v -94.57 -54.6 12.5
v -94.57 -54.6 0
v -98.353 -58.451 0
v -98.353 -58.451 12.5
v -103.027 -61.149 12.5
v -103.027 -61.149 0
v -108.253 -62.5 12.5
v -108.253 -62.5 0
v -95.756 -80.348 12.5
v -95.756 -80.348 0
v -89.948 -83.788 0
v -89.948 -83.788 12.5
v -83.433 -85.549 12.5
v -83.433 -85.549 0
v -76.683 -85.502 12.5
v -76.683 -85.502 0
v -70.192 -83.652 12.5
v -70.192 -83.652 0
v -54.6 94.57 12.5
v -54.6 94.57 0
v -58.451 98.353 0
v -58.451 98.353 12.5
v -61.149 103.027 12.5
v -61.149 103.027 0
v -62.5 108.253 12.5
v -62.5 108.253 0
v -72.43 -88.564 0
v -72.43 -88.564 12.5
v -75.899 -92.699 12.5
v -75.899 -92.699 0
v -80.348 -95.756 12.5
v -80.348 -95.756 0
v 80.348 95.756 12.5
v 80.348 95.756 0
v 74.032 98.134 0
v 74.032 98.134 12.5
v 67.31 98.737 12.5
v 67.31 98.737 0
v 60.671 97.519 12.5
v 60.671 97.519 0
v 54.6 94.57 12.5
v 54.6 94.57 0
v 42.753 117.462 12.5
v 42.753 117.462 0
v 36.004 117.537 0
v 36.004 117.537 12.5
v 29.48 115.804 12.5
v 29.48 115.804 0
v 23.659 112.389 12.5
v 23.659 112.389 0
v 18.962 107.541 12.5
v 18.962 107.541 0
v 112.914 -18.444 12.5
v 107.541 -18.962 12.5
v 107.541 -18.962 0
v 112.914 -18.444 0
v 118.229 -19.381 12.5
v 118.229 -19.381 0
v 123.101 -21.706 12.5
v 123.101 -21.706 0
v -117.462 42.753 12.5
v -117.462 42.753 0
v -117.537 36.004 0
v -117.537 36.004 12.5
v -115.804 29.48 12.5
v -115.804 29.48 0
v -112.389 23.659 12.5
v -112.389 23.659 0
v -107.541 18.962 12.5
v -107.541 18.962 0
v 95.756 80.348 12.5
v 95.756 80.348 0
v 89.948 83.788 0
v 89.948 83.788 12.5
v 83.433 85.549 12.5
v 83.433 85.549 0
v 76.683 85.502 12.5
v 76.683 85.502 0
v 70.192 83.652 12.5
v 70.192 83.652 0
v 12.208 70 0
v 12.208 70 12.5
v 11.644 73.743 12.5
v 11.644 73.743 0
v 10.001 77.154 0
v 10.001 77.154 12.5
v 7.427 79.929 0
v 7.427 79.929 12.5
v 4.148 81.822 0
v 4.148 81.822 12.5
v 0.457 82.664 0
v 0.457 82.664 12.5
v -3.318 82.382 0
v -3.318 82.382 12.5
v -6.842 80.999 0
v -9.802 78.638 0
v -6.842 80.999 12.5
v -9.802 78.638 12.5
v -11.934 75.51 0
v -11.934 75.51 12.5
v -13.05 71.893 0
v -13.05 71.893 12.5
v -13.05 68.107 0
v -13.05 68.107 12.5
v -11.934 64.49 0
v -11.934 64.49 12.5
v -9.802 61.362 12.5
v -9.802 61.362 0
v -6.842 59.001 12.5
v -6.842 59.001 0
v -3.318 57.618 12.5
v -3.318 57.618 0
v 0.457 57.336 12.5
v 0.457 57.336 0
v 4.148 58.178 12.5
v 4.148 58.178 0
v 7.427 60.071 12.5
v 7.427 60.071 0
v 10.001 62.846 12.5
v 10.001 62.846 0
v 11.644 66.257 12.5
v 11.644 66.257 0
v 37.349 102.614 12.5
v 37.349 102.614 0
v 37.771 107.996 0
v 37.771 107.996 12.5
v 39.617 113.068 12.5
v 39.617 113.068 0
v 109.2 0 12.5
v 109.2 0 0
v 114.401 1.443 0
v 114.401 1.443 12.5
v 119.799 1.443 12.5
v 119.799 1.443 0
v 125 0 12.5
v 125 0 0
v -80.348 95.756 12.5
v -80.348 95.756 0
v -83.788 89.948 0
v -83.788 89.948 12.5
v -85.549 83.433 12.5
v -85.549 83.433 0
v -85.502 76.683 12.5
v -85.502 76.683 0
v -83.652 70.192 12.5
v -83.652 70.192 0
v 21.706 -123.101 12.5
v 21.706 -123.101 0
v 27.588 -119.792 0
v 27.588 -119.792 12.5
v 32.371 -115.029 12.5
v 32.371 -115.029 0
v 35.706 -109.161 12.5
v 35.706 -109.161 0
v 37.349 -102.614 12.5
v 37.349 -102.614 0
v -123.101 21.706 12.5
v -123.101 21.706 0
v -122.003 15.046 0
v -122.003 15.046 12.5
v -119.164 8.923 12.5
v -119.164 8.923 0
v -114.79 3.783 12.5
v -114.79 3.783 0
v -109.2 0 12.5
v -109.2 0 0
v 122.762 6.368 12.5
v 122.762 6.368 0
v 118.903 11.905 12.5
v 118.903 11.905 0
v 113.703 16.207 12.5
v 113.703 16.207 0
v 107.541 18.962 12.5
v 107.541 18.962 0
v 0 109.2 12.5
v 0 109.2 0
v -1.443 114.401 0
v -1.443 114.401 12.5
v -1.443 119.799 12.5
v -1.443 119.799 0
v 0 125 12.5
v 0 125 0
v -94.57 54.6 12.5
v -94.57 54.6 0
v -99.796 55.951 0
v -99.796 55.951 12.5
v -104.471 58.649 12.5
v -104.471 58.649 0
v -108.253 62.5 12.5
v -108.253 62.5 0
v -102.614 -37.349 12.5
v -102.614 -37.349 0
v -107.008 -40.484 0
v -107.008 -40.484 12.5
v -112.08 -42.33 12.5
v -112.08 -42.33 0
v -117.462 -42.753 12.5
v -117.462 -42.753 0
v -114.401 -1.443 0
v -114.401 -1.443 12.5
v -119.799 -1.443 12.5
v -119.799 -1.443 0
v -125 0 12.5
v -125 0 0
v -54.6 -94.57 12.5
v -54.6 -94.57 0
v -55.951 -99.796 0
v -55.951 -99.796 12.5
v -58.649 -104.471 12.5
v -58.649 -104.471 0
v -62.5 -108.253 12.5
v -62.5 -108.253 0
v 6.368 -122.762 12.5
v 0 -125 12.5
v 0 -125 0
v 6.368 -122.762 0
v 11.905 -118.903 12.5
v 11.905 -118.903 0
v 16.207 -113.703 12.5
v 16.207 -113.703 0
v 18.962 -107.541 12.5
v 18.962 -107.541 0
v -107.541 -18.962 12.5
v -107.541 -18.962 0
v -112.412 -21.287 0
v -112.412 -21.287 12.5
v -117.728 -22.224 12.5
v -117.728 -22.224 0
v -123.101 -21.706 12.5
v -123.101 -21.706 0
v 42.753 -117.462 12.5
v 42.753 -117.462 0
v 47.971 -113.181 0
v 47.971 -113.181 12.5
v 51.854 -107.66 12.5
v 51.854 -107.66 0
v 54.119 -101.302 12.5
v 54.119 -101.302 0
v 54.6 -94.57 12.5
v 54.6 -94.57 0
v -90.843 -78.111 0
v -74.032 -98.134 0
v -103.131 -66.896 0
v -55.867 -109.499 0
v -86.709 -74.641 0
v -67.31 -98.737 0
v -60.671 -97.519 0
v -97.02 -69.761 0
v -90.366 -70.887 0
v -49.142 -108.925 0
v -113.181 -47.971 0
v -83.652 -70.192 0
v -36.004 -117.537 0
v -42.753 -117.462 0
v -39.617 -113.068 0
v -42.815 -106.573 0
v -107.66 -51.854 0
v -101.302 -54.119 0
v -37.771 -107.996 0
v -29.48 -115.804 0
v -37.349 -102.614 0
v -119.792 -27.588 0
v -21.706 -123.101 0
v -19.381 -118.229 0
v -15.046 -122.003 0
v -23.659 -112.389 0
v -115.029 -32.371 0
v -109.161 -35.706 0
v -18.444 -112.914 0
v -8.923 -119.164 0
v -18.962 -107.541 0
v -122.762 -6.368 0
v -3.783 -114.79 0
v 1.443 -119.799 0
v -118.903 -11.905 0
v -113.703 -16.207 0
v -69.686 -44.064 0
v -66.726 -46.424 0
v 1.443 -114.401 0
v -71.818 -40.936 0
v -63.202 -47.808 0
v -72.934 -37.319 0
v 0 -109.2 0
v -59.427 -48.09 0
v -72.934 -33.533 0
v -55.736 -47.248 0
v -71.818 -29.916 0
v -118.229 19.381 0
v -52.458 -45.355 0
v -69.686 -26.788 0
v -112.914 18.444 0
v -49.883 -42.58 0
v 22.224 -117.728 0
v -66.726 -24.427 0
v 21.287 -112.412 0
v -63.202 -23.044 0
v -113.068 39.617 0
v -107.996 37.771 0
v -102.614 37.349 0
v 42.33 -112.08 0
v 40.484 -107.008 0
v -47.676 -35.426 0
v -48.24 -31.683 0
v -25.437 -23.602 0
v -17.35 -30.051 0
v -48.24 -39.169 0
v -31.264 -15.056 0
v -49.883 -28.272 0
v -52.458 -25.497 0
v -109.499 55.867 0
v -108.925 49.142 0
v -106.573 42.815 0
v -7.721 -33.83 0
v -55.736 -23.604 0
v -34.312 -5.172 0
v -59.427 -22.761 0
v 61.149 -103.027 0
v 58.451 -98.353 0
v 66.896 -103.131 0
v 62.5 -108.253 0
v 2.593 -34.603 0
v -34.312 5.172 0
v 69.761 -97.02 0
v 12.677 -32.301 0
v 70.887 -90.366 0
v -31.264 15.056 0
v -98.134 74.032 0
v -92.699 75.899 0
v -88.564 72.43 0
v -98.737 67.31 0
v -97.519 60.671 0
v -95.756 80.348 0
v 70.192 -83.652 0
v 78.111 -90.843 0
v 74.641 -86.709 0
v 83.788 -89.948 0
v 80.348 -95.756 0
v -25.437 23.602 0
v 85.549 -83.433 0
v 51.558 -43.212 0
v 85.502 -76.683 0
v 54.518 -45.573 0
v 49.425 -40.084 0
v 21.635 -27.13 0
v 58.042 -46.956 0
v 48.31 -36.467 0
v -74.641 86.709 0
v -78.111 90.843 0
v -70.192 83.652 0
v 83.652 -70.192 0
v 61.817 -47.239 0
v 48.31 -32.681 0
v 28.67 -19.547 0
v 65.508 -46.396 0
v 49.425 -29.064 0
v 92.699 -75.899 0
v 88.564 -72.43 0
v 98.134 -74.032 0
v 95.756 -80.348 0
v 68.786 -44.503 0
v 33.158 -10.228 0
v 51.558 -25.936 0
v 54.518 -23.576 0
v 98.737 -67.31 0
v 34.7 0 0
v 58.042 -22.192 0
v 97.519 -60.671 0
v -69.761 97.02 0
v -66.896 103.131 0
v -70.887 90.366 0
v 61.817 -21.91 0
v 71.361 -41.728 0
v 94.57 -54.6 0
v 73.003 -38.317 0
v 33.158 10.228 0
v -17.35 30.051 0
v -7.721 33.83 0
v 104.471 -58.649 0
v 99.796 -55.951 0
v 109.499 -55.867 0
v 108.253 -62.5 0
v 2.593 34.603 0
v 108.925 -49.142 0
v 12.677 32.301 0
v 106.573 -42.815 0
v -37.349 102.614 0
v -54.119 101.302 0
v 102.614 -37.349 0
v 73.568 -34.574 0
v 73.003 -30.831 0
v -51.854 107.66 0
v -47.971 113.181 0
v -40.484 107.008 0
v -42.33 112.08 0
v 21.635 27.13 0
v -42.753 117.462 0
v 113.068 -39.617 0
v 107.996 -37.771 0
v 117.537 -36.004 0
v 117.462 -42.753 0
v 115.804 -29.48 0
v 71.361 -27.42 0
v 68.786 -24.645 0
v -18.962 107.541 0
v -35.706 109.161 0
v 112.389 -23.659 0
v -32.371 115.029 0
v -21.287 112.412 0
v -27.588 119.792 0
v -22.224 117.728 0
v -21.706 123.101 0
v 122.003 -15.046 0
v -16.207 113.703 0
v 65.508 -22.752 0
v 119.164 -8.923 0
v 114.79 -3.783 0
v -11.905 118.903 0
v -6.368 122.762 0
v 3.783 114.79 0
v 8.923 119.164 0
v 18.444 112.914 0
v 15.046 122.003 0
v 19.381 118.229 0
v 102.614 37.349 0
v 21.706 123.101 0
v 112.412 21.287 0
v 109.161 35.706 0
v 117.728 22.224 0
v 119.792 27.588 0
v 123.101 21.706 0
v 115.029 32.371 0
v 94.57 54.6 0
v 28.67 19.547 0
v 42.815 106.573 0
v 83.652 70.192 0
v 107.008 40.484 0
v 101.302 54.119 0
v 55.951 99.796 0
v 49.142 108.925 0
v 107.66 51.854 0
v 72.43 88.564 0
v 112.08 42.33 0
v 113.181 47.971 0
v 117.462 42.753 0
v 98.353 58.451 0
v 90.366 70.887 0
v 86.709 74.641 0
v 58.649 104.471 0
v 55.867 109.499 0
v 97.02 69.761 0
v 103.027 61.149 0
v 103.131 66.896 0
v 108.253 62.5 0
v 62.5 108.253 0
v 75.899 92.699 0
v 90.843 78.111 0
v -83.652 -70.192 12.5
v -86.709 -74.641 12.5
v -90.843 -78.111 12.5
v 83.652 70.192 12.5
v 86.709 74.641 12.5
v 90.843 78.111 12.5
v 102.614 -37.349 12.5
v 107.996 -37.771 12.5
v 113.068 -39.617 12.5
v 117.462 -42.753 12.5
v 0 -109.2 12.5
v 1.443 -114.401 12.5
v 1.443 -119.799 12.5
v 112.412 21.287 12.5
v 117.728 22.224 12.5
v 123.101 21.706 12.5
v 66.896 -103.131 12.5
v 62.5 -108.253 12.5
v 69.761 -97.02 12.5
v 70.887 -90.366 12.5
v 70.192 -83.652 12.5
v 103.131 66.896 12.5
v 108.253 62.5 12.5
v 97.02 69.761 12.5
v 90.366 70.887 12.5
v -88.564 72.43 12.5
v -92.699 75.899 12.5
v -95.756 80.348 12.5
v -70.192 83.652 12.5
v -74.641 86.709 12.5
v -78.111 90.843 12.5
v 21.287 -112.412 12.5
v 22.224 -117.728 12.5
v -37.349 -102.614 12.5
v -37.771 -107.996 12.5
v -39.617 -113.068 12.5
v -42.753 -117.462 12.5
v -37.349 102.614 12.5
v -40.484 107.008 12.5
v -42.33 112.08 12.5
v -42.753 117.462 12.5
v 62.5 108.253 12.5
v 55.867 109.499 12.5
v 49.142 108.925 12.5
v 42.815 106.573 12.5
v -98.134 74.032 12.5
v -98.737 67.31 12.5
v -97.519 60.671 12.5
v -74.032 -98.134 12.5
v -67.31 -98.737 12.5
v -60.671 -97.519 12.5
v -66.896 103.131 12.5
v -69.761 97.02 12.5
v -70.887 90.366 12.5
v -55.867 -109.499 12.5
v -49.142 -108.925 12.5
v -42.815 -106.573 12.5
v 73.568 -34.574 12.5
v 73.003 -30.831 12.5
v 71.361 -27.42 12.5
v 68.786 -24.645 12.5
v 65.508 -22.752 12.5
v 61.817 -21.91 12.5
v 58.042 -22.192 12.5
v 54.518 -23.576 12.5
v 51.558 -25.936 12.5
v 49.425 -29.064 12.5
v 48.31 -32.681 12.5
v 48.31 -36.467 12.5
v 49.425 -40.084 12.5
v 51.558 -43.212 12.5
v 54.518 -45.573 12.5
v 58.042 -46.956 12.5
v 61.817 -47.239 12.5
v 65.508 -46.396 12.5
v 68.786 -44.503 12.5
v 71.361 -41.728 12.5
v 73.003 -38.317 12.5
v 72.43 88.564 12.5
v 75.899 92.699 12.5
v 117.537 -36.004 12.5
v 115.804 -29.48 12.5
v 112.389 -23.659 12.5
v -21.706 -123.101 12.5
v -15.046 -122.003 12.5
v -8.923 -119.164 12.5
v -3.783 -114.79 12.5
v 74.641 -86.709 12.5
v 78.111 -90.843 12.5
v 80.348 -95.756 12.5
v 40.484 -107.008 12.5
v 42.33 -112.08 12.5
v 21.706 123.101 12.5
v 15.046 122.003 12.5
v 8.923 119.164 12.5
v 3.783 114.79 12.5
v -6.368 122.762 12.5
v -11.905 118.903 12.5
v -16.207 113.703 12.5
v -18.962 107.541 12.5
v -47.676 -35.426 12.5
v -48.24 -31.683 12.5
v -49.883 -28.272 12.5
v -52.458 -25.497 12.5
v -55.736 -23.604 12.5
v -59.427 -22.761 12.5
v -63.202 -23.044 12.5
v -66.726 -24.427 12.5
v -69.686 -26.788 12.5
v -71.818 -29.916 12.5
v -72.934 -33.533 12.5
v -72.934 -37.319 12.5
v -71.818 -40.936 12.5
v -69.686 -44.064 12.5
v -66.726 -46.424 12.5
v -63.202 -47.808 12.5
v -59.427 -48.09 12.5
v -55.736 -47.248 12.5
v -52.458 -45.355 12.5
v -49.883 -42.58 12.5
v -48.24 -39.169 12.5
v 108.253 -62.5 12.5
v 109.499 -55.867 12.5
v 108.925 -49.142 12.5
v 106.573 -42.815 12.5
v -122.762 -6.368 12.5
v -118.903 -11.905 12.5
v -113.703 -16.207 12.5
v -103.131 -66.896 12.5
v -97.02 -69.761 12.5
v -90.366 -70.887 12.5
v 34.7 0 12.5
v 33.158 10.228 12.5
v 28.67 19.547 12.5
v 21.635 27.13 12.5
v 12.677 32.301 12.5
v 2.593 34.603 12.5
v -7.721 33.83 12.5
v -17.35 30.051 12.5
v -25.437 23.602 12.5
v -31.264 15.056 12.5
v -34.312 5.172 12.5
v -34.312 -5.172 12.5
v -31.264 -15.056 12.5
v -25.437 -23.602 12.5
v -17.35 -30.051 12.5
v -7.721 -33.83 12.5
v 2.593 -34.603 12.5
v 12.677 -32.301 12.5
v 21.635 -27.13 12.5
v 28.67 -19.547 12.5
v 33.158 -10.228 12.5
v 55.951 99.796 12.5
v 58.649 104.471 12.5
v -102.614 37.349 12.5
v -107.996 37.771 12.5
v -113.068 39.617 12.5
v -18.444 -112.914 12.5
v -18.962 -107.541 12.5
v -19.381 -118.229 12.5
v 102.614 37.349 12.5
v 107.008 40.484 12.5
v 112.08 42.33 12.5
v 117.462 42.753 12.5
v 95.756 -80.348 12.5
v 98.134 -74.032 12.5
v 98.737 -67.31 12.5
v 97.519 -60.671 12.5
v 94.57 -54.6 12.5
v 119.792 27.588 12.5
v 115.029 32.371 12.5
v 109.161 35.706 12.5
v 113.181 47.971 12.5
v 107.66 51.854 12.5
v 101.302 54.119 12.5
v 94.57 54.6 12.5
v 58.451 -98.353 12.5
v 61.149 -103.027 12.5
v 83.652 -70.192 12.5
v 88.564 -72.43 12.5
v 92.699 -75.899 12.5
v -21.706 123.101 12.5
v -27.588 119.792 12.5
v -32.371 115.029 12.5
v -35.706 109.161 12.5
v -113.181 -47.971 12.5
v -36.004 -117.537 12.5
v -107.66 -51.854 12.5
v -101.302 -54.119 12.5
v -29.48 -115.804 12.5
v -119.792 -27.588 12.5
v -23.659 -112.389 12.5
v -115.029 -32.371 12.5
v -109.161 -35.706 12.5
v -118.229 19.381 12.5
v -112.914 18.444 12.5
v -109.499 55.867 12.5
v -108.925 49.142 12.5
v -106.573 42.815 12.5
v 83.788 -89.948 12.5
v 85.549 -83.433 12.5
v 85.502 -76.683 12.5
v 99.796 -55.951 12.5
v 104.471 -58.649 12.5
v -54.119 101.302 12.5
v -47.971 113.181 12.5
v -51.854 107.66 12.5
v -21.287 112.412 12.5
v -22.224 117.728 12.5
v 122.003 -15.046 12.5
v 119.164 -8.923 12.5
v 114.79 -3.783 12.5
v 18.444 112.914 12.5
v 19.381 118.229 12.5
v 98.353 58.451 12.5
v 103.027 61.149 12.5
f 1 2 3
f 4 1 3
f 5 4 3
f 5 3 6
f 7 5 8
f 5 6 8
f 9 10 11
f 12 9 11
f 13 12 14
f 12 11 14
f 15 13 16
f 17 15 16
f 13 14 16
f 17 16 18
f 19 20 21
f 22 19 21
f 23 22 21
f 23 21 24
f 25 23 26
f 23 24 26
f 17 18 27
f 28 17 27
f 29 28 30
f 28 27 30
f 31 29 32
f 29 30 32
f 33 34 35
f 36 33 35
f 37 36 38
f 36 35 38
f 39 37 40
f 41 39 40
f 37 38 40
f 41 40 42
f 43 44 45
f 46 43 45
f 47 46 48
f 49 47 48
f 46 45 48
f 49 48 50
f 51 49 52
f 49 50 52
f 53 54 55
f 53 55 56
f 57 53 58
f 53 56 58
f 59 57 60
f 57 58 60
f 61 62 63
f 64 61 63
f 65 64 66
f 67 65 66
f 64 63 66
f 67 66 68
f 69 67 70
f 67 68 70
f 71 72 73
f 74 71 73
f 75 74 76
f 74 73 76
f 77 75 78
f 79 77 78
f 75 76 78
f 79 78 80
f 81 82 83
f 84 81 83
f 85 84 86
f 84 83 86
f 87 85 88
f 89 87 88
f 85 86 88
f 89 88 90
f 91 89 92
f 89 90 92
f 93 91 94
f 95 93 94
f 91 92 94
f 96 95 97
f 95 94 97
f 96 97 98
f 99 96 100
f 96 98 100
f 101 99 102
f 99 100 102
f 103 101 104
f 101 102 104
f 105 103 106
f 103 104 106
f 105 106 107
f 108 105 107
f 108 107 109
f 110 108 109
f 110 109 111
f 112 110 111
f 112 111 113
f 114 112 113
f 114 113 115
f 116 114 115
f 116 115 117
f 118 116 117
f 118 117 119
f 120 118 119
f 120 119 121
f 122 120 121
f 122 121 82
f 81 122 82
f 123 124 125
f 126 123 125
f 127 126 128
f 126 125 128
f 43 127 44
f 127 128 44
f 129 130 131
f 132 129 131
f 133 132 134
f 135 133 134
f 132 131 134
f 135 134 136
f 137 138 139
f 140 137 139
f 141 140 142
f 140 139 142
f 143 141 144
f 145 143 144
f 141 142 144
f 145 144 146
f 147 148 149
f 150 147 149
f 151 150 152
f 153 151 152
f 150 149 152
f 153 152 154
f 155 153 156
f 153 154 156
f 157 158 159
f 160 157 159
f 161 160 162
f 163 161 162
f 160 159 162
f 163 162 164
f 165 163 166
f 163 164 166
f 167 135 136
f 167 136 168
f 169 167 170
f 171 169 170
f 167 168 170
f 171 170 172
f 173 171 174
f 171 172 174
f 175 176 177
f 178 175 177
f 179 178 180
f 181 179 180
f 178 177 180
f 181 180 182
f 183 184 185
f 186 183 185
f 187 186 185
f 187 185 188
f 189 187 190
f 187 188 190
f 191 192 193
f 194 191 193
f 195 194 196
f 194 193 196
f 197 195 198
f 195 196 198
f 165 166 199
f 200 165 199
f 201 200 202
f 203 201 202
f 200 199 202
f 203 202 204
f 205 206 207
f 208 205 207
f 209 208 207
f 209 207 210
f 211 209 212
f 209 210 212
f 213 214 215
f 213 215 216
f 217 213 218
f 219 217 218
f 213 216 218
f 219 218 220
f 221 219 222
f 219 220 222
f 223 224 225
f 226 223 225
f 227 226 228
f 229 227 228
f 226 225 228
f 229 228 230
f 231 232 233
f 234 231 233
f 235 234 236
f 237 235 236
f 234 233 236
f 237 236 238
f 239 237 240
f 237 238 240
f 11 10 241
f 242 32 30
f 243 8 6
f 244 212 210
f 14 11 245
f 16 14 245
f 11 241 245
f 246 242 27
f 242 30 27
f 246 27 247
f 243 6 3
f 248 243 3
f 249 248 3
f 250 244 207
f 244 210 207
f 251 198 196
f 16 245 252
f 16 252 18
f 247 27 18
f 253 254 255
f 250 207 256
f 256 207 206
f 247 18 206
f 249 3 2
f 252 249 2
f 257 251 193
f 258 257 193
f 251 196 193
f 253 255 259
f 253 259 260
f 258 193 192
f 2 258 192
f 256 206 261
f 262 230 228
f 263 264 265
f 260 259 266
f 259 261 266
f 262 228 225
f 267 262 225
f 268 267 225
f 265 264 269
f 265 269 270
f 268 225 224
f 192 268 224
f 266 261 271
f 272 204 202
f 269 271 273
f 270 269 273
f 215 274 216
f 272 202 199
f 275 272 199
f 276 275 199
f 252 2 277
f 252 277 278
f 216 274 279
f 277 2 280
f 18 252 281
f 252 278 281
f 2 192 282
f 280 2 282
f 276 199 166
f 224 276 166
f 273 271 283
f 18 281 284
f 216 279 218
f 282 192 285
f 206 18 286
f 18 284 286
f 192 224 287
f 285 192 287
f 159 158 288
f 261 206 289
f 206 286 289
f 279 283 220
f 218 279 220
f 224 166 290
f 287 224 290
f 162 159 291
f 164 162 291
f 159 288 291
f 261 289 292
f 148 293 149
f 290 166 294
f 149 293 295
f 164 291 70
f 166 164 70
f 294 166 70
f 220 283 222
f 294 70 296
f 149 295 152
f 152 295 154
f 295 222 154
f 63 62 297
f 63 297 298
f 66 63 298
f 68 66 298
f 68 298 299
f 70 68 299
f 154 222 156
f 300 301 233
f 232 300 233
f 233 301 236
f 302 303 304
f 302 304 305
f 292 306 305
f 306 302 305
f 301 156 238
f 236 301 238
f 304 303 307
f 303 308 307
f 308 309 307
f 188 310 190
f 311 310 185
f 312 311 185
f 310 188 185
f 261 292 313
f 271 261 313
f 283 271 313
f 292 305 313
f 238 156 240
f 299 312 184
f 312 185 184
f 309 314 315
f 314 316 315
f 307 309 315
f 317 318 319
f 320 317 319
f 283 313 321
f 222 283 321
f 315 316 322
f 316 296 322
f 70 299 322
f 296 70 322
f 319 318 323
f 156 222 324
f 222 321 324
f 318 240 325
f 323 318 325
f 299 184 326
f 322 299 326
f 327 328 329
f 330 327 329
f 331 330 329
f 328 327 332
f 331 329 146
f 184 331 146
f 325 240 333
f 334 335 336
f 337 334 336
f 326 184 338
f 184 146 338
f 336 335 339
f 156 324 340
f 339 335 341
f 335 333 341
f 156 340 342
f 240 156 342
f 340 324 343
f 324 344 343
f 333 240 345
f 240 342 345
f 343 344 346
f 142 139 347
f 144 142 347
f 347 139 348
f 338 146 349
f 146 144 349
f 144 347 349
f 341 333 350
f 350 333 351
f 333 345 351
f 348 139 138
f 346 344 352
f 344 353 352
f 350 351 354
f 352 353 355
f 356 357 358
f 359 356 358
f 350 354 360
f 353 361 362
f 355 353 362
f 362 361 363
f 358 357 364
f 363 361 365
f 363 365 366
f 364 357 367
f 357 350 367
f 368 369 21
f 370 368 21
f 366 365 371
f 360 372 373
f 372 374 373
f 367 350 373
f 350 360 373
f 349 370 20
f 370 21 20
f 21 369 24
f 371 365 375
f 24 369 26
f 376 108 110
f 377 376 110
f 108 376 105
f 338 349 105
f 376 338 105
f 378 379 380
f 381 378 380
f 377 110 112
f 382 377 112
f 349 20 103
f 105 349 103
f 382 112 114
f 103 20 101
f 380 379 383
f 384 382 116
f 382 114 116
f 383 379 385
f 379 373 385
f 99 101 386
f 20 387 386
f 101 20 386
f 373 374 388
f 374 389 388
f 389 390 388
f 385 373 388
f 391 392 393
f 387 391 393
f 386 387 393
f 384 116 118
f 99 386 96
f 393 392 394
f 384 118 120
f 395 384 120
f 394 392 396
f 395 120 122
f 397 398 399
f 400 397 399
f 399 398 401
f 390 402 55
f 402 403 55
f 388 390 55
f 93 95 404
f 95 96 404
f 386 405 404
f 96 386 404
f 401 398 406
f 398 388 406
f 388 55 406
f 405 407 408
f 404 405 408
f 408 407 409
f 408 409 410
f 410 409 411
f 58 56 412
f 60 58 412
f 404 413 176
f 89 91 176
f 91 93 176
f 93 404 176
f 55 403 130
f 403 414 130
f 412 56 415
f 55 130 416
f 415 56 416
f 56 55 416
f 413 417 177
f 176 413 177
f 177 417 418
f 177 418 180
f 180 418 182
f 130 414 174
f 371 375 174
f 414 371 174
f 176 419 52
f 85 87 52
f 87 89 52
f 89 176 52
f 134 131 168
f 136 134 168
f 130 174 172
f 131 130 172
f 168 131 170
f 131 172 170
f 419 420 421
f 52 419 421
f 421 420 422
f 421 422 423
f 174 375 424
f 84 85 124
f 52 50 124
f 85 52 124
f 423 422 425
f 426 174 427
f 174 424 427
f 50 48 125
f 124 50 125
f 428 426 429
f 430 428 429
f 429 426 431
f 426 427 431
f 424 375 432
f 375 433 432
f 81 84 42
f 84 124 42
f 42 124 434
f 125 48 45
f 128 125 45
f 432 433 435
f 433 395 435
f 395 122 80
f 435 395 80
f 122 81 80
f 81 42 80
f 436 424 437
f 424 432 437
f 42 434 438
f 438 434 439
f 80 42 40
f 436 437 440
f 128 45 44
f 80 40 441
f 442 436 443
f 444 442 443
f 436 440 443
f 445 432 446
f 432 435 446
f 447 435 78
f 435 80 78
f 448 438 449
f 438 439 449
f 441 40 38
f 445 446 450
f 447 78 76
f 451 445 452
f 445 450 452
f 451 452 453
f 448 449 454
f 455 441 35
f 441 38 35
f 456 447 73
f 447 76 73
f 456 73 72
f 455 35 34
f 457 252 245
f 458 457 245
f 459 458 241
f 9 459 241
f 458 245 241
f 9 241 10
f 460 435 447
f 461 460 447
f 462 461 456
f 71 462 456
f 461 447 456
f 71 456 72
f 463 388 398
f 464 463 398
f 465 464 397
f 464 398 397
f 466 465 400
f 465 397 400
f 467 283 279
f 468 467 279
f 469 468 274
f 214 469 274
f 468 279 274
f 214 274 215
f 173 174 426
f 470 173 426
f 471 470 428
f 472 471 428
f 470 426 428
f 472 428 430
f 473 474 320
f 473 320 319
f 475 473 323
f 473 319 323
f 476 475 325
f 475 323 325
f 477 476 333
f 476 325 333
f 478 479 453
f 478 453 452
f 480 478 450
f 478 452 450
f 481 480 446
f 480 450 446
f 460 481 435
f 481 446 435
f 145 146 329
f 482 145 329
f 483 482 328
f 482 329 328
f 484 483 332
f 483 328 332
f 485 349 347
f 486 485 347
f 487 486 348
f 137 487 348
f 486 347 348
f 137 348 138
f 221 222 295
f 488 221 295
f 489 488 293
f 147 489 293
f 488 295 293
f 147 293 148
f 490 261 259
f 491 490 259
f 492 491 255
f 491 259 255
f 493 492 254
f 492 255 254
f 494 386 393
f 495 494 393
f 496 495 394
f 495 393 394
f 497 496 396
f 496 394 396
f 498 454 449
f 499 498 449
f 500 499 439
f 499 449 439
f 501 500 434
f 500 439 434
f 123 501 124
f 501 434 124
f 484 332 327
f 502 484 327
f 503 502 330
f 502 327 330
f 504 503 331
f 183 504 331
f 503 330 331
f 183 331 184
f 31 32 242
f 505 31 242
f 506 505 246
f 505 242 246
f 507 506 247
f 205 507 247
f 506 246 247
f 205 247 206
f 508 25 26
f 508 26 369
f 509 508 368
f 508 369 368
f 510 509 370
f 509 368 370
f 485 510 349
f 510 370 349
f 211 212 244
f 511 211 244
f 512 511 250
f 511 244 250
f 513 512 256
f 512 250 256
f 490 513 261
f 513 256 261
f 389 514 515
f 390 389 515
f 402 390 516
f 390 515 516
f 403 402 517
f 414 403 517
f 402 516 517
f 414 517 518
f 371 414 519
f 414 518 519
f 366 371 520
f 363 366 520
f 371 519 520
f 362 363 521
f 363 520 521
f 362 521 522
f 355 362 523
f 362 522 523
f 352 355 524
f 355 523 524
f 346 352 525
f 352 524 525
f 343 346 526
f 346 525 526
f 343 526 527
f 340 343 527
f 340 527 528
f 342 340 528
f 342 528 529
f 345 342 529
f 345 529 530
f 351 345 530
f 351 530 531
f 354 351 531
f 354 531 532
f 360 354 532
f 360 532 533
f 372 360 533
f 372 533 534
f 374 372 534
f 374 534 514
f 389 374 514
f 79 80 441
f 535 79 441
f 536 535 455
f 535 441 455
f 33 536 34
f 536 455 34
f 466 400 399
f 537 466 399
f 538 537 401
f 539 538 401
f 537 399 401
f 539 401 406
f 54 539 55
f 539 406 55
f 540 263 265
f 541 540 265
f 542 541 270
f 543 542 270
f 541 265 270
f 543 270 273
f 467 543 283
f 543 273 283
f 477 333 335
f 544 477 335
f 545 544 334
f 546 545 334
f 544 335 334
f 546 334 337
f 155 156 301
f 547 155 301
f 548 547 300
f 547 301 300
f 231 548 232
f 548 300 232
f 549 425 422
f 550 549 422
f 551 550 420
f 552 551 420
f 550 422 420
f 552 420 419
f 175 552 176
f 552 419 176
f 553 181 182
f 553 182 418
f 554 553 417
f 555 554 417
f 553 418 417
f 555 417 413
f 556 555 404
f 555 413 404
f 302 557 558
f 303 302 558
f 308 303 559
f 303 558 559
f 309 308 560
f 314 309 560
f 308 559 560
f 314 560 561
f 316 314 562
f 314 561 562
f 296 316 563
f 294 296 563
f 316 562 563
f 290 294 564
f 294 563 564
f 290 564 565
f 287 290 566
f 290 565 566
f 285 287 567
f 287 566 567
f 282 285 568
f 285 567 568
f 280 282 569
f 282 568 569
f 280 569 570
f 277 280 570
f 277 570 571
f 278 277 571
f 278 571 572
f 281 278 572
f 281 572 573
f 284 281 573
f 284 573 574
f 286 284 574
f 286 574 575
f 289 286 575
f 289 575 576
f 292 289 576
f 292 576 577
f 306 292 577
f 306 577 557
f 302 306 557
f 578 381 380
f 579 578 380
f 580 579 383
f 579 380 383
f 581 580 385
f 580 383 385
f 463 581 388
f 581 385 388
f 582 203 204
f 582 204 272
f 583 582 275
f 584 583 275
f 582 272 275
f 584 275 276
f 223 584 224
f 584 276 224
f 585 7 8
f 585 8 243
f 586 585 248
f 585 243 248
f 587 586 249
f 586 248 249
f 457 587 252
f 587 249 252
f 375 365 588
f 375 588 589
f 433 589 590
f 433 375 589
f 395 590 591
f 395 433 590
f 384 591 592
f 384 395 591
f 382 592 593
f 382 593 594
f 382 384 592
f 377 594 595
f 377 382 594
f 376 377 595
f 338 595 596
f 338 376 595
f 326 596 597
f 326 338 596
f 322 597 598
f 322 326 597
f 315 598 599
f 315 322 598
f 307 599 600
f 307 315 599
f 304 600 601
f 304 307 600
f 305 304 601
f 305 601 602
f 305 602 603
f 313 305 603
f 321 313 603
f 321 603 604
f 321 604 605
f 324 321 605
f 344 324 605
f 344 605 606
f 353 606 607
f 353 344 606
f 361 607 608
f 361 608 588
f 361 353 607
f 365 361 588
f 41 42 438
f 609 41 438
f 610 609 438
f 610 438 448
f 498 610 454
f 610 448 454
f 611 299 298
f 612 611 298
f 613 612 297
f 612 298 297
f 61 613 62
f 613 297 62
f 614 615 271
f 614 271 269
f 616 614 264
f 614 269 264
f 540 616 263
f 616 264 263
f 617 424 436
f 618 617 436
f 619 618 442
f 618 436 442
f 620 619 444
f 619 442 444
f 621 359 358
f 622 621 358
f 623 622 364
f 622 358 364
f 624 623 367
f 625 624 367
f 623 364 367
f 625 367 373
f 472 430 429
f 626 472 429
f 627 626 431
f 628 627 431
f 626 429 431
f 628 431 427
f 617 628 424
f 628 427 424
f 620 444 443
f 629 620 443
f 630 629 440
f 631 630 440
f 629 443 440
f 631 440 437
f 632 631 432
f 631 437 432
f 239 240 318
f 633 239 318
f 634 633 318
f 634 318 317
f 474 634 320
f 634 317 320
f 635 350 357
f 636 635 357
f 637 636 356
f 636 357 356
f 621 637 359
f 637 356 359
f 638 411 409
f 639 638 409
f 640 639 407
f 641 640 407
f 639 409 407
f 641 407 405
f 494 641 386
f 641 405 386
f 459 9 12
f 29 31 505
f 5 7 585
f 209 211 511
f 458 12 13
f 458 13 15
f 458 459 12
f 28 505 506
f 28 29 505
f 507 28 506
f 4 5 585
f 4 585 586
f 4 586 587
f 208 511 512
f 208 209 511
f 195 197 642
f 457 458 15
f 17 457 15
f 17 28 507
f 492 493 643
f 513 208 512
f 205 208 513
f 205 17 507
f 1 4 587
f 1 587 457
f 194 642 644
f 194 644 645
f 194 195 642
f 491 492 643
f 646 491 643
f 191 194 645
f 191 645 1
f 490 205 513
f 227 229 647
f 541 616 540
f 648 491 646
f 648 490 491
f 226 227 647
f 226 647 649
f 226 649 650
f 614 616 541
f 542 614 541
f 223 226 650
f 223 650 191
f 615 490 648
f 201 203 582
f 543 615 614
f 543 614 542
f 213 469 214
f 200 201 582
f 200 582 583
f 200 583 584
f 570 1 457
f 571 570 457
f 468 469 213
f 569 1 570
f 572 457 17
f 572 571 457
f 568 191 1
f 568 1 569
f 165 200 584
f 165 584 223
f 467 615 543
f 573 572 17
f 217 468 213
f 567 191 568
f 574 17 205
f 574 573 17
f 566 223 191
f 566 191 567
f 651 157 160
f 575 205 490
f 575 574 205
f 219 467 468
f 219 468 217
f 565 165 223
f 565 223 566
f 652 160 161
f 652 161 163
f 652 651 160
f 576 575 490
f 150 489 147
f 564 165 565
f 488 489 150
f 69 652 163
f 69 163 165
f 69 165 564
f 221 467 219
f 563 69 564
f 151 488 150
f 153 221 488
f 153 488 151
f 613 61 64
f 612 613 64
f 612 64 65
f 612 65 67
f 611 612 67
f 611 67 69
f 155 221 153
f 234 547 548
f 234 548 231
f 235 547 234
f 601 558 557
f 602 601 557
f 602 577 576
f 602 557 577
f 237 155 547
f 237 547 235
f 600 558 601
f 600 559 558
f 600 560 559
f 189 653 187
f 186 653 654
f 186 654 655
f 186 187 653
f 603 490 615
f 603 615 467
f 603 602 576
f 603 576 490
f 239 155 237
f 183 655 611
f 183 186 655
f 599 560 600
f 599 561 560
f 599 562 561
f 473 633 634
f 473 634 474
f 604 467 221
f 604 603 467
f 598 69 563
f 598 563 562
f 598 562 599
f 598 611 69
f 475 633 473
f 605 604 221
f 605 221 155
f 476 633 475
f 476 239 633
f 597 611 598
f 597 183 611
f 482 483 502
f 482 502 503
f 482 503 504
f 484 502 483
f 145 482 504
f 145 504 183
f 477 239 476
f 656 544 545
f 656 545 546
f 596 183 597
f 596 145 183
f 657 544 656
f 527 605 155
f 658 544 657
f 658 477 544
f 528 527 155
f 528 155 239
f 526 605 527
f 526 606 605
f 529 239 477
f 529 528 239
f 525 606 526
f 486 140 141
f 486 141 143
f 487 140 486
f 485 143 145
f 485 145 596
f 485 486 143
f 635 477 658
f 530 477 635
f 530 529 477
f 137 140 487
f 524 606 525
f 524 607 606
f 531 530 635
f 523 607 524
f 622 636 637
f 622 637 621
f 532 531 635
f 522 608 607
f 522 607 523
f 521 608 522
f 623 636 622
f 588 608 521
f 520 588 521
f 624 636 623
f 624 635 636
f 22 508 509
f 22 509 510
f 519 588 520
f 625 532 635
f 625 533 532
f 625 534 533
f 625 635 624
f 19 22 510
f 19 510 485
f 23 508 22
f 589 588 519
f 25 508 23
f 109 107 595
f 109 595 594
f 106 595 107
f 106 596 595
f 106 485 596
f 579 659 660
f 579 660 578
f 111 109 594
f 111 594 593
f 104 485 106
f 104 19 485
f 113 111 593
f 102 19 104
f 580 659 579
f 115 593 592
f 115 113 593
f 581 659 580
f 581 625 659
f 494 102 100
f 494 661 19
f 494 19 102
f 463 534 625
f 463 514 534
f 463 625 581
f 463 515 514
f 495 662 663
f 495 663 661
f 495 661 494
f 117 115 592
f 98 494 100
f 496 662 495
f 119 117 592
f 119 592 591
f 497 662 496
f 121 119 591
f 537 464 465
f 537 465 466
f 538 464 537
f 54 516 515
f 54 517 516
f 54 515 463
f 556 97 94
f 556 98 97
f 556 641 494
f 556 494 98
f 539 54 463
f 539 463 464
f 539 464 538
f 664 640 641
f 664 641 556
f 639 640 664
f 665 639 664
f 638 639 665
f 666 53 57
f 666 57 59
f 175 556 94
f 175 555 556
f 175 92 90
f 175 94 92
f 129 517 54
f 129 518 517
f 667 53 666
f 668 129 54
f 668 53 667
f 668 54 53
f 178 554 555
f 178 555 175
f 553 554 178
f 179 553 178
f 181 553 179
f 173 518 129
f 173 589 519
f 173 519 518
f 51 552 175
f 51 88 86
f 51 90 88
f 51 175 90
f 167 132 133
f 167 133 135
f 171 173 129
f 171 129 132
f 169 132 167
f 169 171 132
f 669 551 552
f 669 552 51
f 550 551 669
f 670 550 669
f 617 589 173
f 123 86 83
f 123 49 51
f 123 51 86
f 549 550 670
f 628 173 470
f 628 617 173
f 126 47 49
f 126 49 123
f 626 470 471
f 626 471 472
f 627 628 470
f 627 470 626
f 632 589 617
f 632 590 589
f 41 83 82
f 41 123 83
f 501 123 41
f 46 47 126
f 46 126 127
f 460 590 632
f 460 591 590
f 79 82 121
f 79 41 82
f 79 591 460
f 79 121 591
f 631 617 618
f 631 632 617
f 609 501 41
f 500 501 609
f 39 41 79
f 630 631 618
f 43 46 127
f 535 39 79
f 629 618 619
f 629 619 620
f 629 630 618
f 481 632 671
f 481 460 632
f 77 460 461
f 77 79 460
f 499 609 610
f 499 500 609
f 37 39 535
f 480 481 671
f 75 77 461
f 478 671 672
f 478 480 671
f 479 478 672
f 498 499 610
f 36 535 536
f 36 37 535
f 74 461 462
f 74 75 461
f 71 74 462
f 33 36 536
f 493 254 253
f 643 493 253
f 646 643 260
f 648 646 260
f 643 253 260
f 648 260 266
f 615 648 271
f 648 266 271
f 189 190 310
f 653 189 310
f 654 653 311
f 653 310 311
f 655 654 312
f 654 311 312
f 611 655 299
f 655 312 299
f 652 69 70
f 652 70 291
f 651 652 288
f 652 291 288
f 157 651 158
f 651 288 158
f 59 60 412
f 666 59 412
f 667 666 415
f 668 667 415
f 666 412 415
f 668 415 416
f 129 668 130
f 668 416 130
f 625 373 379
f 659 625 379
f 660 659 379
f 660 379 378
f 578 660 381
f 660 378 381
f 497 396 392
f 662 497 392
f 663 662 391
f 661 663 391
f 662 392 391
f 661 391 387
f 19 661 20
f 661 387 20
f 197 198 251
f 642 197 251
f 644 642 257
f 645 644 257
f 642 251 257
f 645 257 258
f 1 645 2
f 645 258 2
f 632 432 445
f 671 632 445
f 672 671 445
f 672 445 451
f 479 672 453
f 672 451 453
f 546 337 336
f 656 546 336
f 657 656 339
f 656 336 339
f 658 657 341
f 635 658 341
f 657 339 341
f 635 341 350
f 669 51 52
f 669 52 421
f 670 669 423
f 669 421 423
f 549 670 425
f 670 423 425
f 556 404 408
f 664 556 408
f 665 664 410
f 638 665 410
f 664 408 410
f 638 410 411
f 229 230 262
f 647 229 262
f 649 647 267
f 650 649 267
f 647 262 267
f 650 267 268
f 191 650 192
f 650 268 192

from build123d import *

# Parameters (mm, degrees)
F0_R     = 34.7
F1_DEPTH = 12.5
F2_R     = 12.7
F3_DEPTH = 25


with BuildPart() as f1:
    # F0 (on Top) → F1 (new body)
    with BuildSketch(Plane.XY):
        with BuildLine():
            ThreePointArc((18.962381, 107.541007), (18.732532, 115.603405), (21.706022, 123.100969))
            ThreePointArc((21.706022, 123.100969), (8.92339, 119.163541), (0, 109.2))
            ThreePointArc((0, 109.2), (-1.626378, 117.1), (0, 125))
            ThreePointArc((0, 125), (-11.904708, 118.902709), (-18.962381, 107.541007))
            ThreePointArc((-18.962381, 107.541007), (-21.935871, 115.03857), (-21.706022, 123.100969))
            ThreePointArc((-21.706022, 123.100969), (-32.371088, 115.029079), (-37.3486, 102.614434))
            ThreePointArc((-37.3486, 102.614434), (-41.578854, 109.481752), (-42.752518, 117.461578))
            ThreePointArc((-42.752518, 117.461578), (-51.853888, 107.660348), (-54.6, 94.569974))
            ThreePointArc((-54.6, 94.569974), (-59.958484, 100.598386), (-62.5, 108.253175))
            ThreePointArc((-62.5, 108.253175), (-69.761134, 97.020413), (-70.192407, 83.652053))
            ThreePointArc((-70.192407, 83.652053), (-76.516307, 88.658389), (-80.348451, 95.755555))
            ThreePointArc((-80.348451, 95.755555), (-85.548724, 83.432561), (-83.652053, 70.192407))
            ThreePointArc((-83.652053, 70.192407), (-90.74922, 74.024552), (-95.755555, 80.348451))
            ThreePointArc((-95.755555, 80.348451), (-98.736959, 67.309653), (-94.569974, 54.6))
            ThreePointArc((-94.569974, 54.6), (-102.224764, 57.141516), (-108.253175, 62.5))
            ThreePointArc((-108.253175, 62.5), (-108.925121, 49.141575), (-102.614434, 37.3486))
            ThreePointArc((-102.614434, 37.3486), (-110.59426, 38.522264), (-117.461578, 42.752518))
            ThreePointArc((-117.461578, 42.752518), (-115.803648, 29.480355), (-107.541007, 18.962381))
            ThreePointArc((-107.541007, 18.962381), (-115.603405, 18.732532), (-123.100969, 21.706022))
            ThreePointArc((-123.100969, 21.706022), (-119.163541, 8.92339), (-109.2, 0))
            ThreePointArc((-109.2, 0), (-117.1, -1.626378), (-125, 0))
            ThreePointArc((-125, 0), (-118.902709, -11.904708), (-107.541007, -18.962381))
            ThreePointArc((-107.541007, -18.962381), (-115.03857, -21.935871), (-123.100969, -21.706022))
            ThreePointArc((-123.100969, -21.706022), (-115.029079, -32.371088), (-102.614434, -37.3486))
            ThreePointArc((-102.614434, -37.3486), (-109.481752, -41.578854), (-117.461578, -42.752518))
            ThreePointArc((-117.461578, -42.752518), (-107.660348, -51.853888), (-94.569974, -54.6))
            ThreePointArc((-94.569974, -54.6), (-100.598386, -59.958484), (-108.253175, -62.5))
            ThreePointArc((-108.253175, -62.5), (-97.020413, -69.761134), (-83.652053, -70.192407))
            ThreePointArc((-83.652053, -70.192407), (-88.658389, -76.516307), (-95.755555, -80.348451))
            ThreePointArc((-95.755555, -80.348451), (-83.432561, -85.548724), (-70.192407, -83.652053))
            ThreePointArc((-70.192407, -83.652053), (-74.024552, -90.74922), (-80.348451, -95.755555))
            ThreePointArc((-80.348451, -95.755555), (-67.309653, -98.736959), (-54.6, -94.569974))
            ThreePointArc((-54.6, -94.569974), (-57.141516, -102.224764), (-62.5, -108.253175))
            ThreePointArc((-62.5, -108.253175), (-49.141575, -108.925121), (-37.3486, -102.614434))
            ThreePointArc((-37.3486, -102.614434), (-38.522264, -110.59426), (-42.752518, -117.461578))
            ThreePointArc((-42.752518, -117.461578), (-29.480355, -115.803648), (-18.962381, -107.541007))
            ThreePointArc((-18.962381, -107.541007), (-18.732532, -115.603405), (-21.706022, -123.100969))
            ThreePointArc((-21.706022, -123.100969), (-8.92339, -119.163541), (0, -109.2))
            ThreePointArc((0, -109.2), (1.626378, -117.1), (0, -125))
            ThreePointArc((0, -125), (11.904708, -118.902709), (18.962381, -107.541007))
            ThreePointArc((18.962381, -107.541007), (21.935871, -115.03857), (21.706022, -123.100969))
            ThreePointArc((21.706022, -123.100969), (32.371088, -115.029079), (37.3486, -102.614434))
            ThreePointArc((37.3486, -102.614434), (41.578854, -109.481752), (42.752518, -117.461578))
            ThreePointArc((42.752518, -117.461578), (51.853888, -107.660348), (54.6, -94.569974))
            ThreePointArc((54.6, -94.569974), (59.958484, -100.598386), (62.5, -108.253175))
            ThreePointArc((62.5, -108.253175), (69.761134, -97.020413), (70.192407, -83.652053))
            ThreePointArc((70.192407, -83.652053), (76.516307, -88.658389), (80.348451, -95.755555))
            ThreePointArc((80.348451, -95.755555), (85.548724, -83.432561), (83.652053, -70.192407))
            ThreePointArc((83.652053, -70.192407), (90.74922, -74.024552), (95.755555, -80.348451))
            ThreePointArc((95.755555, -80.348451), (98.736959, -67.309653), (94.569974, -54.6))
            ThreePointArc((94.569974, -54.6), (102.224764, -57.141516), (108.253175, -62.5))
            ThreePointArc((108.253175, -62.5), (108.925121, -49.141575), (102.614434, -37.3486))
            ThreePointArc((102.614434, -37.3486), (110.59426, -38.522264), (117.461578, -42.752518))
            ThreePointArc((117.461578, -42.752518), (115.803648, -29.480355), (107.541007, -18.962381))
            ThreePointArc((107.541007, -18.962381), (115.603405, -18.732532), (123.100969, -21.706022))
            ThreePointArc((123.100969, -21.706022), (119.163541, -8.92339), (109.2, 0))
            ThreePointArc((109.2, 0), (117.1, 1.626378), (125, 0))
            ThreePointArc((125, 0), (118.902709, 11.904708), (107.541007, 18.962381))
            ThreePointArc((107.541007, 18.962381), (115.03857, 21.935871), (123.100969, 21.706022))
            ThreePointArc((123.100969, 21.706022), (115.029079, 32.371088), (102.614434, 37.3486))
            ThreePointArc((102.614434, 37.3486), (109.481752, 41.578854), (117.461578, 42.752518))
            ThreePointArc((117.461578, 42.752518), (107.660348, 51.853888), (94.569974, 54.6))
            ThreePointArc((94.569974, 54.6), (100.598386, 59.958484), (108.253175, 62.5))
            ThreePointArc((108.253175, 62.5), (97.020413, 69.761134), (83.652053, 70.192407))
            ThreePointArc((83.652053, 70.192407), (88.658389, 76.516307), (95.755555, 80.348451))
            ThreePointArc((95.755555, 80.348451), (83.432561, 85.548724), (70.192407, 83.652053))
            ThreePointArc((70.192407, 83.652053), (74.024552, 90.74922), (80.348451, 95.755555))
            ThreePointArc((80.348451, 95.755555), (67.309653, 98.736959), (54.6, 94.569974))
            ThreePointArc((54.6, 94.569974), (57.141516, 102.224764), (62.5, 108.253175))
            ThreePointArc((62.5, 108.253175), (49.141575, 108.925121), (37.3486, 102.614434))
            ThreePointArc((37.3486, 102.614434), (38.522264, 110.59426), (42.752518, 117.461578))
            ThreePointArc((42.752518, 117.461578), (29.480355, 115.803648), (18.962381, 107.541007))
        make_face()
        Circle(F0_R, mode=Mode.SUBTRACT)
    extrude(amount=F1_DEPTH)

    # F2 (on face) → F3 (cut)
    with BuildSketch(Plane.XY.offset(12.5)):
        with Locations((-0.491815, 70)):
            Circle(F2_R)
        with Locations((-60.375871, -35.425925)):
            Circle(F2_R)
        with Locations((60.867686, -34.574075)):
            Circle(F2_R)
    extrude(amount=-F3_DEPTH, mode=Mode.SUBTRACT)


solid = f1.part
